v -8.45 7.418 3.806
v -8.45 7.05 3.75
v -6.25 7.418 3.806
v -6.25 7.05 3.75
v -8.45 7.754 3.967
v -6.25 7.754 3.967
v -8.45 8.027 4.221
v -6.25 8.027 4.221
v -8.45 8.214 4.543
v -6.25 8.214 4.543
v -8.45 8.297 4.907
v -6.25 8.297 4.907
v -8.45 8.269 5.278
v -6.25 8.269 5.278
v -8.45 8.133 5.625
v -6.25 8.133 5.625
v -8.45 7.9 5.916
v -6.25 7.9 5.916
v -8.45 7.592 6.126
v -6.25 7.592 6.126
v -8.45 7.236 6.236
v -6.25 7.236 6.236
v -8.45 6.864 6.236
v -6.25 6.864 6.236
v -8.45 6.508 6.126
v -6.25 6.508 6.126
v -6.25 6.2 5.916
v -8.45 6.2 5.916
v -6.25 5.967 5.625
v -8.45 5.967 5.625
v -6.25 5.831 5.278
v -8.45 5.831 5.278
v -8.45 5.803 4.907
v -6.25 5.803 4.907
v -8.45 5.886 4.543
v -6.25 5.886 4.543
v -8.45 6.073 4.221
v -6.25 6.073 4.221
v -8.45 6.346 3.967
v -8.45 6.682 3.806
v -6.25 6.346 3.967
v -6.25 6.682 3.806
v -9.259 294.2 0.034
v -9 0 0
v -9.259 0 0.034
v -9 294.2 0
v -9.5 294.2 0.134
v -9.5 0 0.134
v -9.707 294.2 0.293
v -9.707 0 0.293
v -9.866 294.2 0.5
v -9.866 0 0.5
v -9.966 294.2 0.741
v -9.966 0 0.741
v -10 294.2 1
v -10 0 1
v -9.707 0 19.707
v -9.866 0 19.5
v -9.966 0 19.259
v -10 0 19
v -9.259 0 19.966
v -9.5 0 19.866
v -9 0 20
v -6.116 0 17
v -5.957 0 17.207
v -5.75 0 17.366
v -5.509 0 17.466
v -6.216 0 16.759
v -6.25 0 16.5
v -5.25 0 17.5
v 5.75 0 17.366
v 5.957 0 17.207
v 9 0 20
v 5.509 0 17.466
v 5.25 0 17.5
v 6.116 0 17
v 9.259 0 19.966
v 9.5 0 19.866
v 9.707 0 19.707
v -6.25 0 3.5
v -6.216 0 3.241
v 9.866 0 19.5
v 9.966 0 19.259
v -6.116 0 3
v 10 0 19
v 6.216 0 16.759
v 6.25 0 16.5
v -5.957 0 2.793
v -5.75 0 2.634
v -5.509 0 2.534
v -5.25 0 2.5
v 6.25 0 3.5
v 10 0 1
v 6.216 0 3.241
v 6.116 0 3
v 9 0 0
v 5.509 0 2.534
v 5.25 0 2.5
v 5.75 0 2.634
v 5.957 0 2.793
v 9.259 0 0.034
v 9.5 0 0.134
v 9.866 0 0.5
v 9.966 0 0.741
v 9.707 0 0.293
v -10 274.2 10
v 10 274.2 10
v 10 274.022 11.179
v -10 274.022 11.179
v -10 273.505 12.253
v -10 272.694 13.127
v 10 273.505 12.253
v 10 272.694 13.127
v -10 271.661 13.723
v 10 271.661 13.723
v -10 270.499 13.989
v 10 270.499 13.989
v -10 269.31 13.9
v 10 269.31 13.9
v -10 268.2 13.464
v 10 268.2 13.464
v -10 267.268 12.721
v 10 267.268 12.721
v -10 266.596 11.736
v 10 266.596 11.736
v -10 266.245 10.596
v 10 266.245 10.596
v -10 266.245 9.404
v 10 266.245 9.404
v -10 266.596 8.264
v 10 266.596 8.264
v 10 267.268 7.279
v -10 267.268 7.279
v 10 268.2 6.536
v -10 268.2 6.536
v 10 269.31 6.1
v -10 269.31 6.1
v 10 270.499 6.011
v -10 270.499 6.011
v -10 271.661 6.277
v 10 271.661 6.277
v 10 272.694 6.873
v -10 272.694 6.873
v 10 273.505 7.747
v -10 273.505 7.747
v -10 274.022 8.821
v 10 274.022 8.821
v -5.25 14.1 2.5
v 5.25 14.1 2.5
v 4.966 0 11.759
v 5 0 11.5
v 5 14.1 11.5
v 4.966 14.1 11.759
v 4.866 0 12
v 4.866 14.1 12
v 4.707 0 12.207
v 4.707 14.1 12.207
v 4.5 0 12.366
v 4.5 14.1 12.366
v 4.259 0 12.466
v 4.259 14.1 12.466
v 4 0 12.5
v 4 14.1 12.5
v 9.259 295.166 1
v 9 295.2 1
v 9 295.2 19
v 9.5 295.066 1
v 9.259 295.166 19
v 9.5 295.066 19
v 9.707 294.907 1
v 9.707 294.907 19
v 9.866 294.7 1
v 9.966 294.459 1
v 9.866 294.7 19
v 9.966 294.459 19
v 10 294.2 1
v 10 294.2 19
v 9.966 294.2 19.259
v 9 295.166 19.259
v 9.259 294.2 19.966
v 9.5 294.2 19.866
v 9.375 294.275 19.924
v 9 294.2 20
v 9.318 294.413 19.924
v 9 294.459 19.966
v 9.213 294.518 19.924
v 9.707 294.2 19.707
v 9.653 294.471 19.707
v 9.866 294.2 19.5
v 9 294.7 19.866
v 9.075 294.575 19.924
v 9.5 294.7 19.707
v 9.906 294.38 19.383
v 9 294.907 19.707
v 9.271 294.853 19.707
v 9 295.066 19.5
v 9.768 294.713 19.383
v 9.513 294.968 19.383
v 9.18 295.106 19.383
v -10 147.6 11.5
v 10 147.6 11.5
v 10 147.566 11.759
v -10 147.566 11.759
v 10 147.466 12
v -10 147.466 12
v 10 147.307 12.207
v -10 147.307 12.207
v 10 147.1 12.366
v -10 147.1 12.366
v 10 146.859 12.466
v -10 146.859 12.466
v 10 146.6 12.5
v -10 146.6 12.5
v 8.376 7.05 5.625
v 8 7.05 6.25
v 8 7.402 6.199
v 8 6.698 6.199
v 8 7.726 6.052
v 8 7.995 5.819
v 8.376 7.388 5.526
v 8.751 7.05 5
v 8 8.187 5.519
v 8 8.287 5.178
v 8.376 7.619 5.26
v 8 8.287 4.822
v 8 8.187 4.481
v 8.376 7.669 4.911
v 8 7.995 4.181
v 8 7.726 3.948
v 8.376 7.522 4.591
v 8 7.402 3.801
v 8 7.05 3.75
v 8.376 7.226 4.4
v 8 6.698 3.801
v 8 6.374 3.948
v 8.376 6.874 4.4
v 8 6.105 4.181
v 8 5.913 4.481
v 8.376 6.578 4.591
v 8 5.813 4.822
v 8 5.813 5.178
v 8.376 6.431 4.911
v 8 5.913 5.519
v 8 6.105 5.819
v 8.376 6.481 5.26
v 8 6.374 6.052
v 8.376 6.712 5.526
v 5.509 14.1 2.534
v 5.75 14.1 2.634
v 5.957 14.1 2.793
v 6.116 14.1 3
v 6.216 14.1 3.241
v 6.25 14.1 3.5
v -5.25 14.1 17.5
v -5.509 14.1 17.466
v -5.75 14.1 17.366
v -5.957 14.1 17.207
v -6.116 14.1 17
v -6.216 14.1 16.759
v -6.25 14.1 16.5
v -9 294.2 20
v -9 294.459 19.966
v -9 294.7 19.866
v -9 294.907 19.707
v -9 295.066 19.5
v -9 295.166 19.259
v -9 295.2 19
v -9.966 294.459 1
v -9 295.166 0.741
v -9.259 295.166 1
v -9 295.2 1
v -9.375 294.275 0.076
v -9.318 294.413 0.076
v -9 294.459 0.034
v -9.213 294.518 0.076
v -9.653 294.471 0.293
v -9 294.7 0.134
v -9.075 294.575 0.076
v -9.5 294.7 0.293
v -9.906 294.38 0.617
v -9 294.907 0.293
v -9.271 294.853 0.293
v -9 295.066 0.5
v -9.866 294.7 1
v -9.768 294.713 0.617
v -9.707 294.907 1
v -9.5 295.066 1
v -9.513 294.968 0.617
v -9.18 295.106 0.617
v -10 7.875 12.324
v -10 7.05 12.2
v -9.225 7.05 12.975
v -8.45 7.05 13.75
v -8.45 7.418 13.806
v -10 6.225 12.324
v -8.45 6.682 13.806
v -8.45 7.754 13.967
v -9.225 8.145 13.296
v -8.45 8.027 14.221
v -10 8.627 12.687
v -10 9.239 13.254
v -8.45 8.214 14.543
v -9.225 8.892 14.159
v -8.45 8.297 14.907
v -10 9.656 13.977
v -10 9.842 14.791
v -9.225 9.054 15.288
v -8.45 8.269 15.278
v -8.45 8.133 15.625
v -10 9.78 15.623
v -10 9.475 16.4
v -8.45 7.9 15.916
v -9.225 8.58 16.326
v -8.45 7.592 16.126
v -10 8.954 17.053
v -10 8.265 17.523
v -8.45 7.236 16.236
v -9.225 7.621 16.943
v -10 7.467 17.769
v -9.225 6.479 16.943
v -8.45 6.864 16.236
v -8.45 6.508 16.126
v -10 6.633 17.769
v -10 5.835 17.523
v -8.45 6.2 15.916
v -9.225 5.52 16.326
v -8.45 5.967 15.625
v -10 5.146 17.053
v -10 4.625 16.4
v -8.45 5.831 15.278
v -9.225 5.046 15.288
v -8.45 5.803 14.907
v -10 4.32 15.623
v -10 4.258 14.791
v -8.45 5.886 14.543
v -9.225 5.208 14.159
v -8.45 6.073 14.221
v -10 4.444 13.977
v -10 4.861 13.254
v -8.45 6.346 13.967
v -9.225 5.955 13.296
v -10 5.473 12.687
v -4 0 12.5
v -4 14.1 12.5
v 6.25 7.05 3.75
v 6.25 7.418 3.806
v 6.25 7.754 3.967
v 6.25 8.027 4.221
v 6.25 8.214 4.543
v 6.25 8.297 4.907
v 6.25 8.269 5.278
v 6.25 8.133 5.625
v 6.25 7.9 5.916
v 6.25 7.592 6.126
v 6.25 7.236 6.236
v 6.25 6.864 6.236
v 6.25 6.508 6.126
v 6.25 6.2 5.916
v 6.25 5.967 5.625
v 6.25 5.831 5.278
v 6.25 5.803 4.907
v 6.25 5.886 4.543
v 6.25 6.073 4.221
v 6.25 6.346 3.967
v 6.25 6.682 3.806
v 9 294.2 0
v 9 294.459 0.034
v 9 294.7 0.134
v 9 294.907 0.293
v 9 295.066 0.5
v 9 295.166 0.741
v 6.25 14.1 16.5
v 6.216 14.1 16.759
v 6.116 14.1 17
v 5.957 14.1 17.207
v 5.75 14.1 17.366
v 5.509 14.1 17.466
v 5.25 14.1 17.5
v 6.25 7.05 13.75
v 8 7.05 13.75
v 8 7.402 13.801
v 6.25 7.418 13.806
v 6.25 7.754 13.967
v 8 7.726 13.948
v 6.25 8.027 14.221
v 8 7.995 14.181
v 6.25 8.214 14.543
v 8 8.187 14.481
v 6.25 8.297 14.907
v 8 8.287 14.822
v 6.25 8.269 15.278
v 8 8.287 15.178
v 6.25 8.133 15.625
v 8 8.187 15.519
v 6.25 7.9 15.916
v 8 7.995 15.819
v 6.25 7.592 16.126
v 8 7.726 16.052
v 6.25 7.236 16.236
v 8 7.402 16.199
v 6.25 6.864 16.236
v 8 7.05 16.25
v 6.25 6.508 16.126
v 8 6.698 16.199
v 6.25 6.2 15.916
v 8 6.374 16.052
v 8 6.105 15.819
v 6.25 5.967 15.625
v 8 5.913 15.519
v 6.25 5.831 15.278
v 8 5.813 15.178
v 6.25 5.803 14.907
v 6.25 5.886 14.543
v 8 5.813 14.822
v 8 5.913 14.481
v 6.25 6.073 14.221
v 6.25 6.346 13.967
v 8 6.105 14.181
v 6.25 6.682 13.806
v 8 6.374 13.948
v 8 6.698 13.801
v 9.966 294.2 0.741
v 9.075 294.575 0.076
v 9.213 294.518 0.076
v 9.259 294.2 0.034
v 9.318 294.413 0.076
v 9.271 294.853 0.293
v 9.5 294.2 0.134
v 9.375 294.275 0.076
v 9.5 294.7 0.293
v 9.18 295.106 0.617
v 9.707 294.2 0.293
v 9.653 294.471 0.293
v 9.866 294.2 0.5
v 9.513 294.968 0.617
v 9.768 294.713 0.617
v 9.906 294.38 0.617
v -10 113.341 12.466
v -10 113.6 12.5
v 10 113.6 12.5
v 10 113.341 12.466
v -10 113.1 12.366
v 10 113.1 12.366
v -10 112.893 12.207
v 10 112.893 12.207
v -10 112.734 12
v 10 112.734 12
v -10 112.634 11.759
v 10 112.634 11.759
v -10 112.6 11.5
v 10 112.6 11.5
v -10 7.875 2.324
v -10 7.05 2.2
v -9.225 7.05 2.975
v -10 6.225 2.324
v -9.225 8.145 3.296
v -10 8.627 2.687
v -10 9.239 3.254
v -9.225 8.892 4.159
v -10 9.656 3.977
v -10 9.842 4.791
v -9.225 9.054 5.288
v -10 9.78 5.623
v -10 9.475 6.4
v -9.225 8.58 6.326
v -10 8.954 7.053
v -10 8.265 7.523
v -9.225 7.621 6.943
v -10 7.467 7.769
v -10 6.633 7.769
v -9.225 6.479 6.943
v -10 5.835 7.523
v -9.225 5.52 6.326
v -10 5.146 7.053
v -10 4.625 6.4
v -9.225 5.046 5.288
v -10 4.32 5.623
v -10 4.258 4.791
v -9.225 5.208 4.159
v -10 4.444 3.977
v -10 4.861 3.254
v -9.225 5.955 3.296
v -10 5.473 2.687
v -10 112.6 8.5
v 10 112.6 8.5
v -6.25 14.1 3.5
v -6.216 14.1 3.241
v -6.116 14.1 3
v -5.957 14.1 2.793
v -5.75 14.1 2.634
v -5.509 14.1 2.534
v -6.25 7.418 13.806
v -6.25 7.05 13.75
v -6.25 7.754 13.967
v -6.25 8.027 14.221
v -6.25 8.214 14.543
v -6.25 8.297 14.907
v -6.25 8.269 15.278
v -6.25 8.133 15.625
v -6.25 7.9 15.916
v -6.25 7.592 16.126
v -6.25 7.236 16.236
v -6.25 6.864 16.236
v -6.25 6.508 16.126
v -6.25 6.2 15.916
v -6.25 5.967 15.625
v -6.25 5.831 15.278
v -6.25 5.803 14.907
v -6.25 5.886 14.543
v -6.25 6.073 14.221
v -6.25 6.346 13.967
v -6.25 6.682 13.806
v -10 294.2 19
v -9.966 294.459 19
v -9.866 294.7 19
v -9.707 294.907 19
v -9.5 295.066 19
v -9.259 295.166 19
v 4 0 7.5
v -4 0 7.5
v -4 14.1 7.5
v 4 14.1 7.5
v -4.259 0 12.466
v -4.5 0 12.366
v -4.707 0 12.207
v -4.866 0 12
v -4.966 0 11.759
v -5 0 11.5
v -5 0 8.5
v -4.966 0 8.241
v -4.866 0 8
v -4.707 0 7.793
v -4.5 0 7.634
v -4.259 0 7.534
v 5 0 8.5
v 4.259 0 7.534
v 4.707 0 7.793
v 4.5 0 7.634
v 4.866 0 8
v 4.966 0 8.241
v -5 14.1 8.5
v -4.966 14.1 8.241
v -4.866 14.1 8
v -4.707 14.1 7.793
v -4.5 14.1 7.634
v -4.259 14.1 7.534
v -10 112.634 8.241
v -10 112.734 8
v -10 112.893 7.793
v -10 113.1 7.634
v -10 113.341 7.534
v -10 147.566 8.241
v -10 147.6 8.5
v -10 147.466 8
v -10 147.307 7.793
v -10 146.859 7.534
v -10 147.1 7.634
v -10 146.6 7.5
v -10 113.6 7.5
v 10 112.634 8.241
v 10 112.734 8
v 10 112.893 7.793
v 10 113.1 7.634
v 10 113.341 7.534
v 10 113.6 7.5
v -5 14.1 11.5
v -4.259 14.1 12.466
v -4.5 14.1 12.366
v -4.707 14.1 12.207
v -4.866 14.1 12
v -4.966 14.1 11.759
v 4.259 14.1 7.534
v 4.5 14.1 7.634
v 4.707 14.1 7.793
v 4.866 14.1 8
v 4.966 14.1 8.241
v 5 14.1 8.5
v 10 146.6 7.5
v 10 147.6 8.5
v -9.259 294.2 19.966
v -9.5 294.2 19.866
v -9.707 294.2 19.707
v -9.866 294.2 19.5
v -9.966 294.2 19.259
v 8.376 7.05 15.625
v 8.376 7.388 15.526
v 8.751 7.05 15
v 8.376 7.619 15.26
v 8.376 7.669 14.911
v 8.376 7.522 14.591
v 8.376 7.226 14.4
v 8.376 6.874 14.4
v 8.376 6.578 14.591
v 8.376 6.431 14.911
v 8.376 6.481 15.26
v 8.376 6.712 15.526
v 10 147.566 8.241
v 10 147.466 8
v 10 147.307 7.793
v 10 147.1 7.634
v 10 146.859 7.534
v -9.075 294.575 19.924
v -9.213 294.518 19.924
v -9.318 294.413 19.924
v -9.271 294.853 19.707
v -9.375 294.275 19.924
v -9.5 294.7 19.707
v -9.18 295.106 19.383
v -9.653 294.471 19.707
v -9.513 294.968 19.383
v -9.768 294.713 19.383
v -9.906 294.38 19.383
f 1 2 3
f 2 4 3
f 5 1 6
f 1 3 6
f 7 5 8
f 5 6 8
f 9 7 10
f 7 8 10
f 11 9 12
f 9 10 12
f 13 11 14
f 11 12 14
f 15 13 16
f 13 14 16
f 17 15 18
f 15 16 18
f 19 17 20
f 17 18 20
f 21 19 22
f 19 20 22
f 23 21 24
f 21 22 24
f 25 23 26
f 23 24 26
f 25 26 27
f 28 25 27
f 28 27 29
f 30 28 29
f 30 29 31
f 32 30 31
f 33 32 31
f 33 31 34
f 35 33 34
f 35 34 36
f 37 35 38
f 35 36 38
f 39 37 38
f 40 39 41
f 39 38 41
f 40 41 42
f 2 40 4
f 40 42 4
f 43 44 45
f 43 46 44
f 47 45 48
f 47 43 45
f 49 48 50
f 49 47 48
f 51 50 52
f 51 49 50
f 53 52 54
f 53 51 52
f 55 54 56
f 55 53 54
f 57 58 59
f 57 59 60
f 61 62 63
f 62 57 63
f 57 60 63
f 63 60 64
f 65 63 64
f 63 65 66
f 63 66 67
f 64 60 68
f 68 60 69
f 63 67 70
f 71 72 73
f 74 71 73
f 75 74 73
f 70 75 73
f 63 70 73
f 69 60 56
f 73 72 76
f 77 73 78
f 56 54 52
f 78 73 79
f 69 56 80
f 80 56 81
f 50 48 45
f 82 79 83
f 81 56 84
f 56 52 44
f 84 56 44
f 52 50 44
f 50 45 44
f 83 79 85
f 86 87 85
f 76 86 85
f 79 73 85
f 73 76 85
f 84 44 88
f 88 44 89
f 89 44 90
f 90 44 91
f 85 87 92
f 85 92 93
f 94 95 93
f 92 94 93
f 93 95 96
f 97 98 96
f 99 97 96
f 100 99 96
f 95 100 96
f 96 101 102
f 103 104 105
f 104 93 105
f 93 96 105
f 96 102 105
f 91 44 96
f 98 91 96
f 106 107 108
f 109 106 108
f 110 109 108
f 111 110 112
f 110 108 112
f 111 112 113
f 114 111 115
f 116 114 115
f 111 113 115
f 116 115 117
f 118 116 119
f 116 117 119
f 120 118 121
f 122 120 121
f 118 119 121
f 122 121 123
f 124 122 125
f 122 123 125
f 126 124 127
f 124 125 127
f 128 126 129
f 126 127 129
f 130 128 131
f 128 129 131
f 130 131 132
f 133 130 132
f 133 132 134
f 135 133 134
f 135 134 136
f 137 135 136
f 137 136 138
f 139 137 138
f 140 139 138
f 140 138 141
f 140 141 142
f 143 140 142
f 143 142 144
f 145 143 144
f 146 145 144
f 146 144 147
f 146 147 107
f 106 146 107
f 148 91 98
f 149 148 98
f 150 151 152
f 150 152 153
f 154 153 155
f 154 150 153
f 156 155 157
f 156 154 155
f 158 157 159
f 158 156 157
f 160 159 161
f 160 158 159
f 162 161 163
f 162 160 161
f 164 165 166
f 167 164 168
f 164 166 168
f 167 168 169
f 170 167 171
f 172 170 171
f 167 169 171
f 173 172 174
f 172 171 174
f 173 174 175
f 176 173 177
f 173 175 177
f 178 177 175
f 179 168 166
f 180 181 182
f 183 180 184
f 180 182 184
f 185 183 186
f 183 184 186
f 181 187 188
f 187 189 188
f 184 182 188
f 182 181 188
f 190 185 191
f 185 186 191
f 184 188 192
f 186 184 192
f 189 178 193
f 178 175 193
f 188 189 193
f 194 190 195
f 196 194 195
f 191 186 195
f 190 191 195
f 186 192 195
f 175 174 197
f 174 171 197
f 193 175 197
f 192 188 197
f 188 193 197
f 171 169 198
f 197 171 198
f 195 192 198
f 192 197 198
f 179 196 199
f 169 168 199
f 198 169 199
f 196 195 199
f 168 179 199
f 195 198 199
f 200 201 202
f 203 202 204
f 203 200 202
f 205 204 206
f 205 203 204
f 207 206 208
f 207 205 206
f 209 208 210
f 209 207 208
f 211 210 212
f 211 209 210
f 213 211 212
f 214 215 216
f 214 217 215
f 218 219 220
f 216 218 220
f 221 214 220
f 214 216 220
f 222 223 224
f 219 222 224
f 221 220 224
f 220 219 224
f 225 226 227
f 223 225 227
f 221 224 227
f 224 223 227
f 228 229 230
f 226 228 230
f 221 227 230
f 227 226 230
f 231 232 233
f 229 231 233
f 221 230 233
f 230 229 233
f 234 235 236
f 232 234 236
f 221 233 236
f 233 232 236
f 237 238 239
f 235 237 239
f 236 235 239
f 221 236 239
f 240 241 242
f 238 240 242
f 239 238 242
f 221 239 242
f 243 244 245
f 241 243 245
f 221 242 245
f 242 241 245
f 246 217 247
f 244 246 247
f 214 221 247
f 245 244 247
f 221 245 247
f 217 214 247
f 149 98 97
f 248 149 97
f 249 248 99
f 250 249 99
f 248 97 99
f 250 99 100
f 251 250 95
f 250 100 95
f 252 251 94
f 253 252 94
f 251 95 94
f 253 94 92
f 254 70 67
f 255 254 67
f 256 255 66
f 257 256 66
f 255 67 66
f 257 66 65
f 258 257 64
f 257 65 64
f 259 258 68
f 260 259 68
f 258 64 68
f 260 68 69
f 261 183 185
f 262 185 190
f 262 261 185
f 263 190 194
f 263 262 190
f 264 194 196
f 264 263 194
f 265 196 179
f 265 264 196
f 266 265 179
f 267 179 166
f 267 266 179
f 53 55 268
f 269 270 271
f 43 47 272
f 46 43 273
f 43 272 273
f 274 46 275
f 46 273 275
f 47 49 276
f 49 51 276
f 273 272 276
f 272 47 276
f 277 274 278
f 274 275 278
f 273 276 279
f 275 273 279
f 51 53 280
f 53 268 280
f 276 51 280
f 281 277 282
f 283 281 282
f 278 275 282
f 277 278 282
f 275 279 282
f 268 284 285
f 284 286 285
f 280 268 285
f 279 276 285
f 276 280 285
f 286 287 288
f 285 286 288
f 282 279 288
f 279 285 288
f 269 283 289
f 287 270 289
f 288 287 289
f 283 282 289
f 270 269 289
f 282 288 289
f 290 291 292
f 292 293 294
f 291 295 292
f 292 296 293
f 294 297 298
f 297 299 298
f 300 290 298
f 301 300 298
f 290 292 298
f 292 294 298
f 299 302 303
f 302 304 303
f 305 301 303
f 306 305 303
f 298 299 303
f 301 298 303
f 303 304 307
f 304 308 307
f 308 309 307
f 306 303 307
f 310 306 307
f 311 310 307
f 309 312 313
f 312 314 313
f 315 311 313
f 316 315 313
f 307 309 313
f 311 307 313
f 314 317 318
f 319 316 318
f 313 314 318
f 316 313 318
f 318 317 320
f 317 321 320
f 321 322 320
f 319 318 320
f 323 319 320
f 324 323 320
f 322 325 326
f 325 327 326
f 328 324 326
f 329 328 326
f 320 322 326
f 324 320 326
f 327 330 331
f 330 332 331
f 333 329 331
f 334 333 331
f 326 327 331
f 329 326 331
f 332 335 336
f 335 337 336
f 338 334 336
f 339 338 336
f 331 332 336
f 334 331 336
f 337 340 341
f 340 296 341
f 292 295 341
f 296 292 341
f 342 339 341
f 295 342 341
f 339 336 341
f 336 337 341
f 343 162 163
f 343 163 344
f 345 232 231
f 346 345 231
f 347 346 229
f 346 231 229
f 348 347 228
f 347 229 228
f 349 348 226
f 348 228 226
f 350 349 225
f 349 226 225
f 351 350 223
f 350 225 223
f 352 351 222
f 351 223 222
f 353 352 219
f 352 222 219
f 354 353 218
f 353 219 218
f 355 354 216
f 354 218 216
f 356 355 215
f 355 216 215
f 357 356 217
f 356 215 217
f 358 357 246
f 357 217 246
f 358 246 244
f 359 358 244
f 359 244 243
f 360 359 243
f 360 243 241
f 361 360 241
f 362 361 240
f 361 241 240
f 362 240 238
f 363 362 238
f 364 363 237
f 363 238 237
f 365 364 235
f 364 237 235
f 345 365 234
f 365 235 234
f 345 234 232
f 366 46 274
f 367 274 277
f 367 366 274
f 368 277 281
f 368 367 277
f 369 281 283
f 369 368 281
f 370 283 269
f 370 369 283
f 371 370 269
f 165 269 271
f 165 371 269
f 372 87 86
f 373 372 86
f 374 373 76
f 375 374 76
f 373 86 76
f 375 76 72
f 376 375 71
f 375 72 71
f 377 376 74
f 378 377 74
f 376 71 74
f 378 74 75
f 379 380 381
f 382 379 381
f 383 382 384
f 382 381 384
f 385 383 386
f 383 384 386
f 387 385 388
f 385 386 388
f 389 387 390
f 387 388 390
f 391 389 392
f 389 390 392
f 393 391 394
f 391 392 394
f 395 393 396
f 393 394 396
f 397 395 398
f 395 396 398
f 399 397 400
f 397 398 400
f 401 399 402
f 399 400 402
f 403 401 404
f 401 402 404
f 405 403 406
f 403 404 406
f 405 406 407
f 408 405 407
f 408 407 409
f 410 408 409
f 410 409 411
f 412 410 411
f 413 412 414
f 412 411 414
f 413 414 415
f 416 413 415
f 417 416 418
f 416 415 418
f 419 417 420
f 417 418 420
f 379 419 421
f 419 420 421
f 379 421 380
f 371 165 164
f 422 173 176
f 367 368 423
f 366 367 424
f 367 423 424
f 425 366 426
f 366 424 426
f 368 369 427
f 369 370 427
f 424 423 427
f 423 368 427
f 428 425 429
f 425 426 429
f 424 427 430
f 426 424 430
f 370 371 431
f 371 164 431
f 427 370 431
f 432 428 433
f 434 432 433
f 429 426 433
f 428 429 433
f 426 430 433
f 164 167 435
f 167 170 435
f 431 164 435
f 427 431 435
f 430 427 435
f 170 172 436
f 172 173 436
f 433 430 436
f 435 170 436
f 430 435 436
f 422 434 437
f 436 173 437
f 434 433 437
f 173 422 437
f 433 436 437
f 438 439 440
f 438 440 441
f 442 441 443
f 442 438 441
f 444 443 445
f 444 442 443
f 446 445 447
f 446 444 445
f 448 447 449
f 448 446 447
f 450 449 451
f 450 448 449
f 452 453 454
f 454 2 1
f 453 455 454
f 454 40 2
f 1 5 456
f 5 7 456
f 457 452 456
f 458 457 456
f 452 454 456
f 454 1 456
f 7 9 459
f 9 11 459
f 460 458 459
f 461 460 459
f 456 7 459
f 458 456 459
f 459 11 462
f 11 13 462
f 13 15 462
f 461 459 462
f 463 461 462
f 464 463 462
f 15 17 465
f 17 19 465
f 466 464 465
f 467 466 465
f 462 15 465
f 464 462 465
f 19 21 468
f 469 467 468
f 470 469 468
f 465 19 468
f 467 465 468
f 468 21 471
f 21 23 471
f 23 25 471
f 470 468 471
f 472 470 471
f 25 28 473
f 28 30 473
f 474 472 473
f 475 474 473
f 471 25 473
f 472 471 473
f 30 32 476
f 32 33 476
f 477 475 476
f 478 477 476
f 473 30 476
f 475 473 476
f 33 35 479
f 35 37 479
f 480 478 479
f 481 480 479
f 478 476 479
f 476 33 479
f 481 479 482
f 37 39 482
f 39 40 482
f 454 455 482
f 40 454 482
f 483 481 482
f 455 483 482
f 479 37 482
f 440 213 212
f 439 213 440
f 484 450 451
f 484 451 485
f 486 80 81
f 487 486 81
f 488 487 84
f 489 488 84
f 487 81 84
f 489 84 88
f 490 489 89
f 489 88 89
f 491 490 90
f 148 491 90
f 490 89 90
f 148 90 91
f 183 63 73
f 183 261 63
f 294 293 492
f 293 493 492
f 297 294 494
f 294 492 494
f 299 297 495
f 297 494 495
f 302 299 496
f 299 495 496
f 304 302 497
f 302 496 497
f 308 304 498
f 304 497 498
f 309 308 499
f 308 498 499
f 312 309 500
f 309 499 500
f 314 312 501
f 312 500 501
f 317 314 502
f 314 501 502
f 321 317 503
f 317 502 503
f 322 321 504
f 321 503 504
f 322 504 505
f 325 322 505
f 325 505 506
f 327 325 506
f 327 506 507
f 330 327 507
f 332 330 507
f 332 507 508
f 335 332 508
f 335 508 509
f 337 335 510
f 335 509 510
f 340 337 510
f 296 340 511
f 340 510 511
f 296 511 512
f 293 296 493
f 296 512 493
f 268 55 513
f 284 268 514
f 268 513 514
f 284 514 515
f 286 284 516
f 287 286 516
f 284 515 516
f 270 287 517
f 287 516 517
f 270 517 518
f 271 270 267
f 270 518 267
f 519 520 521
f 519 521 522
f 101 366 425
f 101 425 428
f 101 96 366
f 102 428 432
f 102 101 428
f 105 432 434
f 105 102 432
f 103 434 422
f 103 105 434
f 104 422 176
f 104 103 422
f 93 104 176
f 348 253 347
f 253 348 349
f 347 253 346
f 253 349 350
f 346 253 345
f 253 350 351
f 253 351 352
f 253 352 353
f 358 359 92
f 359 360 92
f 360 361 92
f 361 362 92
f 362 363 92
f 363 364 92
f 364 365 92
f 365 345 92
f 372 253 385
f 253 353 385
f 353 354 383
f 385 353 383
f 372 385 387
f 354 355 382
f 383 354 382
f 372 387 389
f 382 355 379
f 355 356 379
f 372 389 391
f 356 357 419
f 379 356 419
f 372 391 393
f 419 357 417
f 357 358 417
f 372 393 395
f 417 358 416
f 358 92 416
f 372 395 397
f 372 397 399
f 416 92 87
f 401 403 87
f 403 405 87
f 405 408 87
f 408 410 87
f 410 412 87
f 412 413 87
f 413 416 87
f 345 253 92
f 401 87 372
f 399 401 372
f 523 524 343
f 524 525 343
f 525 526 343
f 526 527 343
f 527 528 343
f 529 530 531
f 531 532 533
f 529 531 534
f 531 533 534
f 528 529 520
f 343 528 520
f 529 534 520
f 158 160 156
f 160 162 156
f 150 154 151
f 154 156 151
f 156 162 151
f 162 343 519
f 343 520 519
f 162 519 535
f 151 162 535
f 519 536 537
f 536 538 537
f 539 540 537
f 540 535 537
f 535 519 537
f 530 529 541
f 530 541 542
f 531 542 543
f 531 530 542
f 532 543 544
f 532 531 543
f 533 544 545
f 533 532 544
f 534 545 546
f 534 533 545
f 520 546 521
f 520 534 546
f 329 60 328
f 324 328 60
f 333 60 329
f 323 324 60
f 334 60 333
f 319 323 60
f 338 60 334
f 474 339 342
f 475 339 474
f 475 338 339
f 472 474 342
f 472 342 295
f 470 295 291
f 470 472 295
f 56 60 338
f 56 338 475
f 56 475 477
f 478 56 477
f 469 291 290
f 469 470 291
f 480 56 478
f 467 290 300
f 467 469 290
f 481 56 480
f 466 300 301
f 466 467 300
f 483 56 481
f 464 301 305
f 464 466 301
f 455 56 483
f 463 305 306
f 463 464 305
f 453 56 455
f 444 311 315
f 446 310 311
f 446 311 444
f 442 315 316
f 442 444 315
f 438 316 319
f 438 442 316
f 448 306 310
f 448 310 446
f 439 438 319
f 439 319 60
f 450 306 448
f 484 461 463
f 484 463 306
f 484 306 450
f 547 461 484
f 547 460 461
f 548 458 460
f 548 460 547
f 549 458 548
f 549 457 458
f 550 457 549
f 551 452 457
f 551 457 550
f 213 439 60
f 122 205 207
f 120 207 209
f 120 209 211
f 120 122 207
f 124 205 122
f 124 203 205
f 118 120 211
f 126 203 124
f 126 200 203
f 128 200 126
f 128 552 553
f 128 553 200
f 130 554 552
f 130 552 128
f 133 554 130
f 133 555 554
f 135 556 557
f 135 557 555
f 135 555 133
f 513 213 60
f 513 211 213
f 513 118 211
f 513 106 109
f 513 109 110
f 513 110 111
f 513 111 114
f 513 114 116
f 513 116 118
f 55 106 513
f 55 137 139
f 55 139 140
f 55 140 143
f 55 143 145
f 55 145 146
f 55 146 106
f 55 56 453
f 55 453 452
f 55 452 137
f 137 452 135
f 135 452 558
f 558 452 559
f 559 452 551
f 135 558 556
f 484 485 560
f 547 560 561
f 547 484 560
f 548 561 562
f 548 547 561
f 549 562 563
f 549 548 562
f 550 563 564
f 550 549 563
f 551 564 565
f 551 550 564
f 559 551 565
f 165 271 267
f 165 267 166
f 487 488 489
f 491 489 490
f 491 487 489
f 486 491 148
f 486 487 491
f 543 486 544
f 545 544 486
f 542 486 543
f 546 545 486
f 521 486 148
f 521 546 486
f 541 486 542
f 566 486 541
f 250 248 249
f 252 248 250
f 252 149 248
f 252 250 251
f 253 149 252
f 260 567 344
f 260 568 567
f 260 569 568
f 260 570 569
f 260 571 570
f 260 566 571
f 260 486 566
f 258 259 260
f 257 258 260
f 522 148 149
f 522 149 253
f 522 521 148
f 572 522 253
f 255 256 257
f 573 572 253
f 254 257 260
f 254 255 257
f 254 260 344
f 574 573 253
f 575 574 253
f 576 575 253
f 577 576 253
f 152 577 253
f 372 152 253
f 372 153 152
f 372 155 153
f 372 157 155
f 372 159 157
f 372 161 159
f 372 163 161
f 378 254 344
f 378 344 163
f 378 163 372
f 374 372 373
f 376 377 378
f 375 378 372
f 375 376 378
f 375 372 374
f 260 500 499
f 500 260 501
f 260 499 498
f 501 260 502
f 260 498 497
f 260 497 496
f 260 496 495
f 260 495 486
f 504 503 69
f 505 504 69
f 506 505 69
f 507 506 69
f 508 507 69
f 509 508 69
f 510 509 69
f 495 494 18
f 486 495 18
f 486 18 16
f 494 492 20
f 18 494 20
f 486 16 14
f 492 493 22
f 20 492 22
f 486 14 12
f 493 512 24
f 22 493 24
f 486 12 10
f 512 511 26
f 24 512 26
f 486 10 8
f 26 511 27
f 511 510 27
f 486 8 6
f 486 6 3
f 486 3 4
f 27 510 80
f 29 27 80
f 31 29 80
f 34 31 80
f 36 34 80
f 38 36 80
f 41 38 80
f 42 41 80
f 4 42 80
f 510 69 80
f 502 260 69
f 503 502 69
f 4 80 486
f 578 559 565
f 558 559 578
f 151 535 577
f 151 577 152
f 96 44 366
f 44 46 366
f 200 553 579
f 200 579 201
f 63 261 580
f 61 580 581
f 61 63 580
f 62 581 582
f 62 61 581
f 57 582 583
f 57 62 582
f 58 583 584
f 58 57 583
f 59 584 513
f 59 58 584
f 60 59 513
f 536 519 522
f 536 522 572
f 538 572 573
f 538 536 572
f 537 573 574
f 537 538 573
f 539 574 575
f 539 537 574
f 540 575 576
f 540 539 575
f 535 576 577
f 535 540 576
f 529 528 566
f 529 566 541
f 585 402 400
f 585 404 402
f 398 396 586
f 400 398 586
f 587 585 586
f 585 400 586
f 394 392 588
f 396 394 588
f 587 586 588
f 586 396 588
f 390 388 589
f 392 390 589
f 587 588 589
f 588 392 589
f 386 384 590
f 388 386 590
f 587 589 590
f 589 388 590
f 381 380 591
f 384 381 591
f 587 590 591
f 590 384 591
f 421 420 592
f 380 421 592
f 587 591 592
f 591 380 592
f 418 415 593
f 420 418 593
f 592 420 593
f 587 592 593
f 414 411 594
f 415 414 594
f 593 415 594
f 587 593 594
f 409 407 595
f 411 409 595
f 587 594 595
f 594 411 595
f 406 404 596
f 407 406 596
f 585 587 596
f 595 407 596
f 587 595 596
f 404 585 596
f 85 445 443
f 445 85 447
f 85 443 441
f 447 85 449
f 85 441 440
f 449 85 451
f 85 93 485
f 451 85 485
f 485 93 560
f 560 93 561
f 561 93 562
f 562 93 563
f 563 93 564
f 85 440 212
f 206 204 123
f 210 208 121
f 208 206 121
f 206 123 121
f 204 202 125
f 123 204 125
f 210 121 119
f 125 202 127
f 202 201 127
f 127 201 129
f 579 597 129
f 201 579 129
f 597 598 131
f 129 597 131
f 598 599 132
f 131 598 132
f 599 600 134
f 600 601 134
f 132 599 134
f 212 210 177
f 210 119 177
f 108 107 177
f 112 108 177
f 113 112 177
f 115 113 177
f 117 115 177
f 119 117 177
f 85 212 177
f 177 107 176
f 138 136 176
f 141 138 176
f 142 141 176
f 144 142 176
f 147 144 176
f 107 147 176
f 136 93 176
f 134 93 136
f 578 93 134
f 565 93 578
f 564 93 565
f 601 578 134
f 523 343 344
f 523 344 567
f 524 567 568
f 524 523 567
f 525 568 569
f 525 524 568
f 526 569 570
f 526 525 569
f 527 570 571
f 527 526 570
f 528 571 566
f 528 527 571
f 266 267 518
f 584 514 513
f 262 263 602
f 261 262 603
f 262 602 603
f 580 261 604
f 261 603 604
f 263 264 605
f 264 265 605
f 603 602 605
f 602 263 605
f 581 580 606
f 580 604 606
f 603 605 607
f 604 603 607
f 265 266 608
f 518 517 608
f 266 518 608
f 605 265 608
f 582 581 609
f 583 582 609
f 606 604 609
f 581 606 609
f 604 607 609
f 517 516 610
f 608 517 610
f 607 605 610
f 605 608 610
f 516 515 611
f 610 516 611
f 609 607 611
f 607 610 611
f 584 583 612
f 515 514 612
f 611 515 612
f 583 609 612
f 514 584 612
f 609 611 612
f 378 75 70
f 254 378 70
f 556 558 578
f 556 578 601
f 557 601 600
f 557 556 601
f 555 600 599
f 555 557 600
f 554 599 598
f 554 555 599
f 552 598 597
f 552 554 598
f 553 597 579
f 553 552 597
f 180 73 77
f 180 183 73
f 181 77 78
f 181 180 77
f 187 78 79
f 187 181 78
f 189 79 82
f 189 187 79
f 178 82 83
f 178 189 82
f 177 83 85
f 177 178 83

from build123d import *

# Parameters (mm, degrees)
SKETCH1_W                       = 20
SKETCH1_H                       = 295.2
BOSS_EXTRUDE1_DEPTH             = 20
CUT_EXTRUDE1_REACH              = 298.552
SKETCH2_R                       = 4
CUT_EXTRUDE2_DEPTH              = 14.1
CUT_EXTRUDE3_DEPTH              = 297.551917883
M3X0_5_TAPPED_HOLE1_D           = 2.5
M3X0_5_TAPPED_HOLE1_DEPTH       = 18
M3X0_5_TAPPED_HOLE1_CSINK_D     = 5.6
M3X0_5_TAPPED_HOLE1_CSINK_ANGLE = 90
M3X0_5_TAPPED_HOLE1_TIP         = 0.751075774
FILLET1_R                       = 1
FILLET2_R                       = 1


with BuildPart() as part:
    # Sketch1 → Boss-Extrude1 (new body)
    with BuildSketch(Plane.XY):
        with Locations((0, 147.6)):
            Rectangle(SKETCH1_W, SKETCH1_H)
    extrude(amount=BOSS_EXTRUDE1_DEPTH)

    # Sketch2 → Cut-Extrude1 (cut, up to next)
    with BuildSketch(Plane(origin=(10, 0, 0), x_dir=(0, 0, -1), z_dir=(1, 0, 0)), mode=Mode.PRIVATE) as cut_extrude1_sk1:
        with Locations(Location((-10, 270.2, 0), (0, 0, 90))):
            Circle(SKETCH2_R)
    cut_extrude1_tool1 = extrude(cut_extrude1_sk1.sketch, amount=-CUT_EXTRUDE1_REACH, mode=Mode.PRIVATE) & part.part
    add(cut_extrude1_tool1.solids().sort_by_distance((10, 270.2, 10))[0], mode=Mode.SUBTRACT)

    # Sketch3 → Cut-Extrude2 (cut)
    with BuildSketch(Plane.XZ):
        with BuildLine():
            Line((-5.25, 2.5), (5.25, 2.5))
            ThreePointArc((5.25, 2.5), (5.957106781, 2.792893219), (6.25, 3.5))
            Line((6.25, 3.5), (6.25, 16.5))
            ThreePointArc((6.25, 16.5), (5.957106781, 17.207106781), (5.25, 17.5))
            Line((5.25, 17.5), (-5.25, 17.5))
            ThreePointArc((-5.25, 17.5), (-5.957106781, 17.207106781), (-6.25, 16.5))
            Line((-6.25, 16.5), (-6.25, 3.5))
            ThreePointArc((-6.25, 3.5), (-5.957106781, 2.792893219), (-5.25, 2.5))
        make_face()
        with BuildLine():
            Line((-4, 7.5), (4, 7.5))
            ThreePointArc((4, 7.5), (4.707106781, 7.792893219), (5, 8.5))
            Line((5, 8.5), (5, 11.5))
            ThreePointArc((5, 11.5), (4.707106781, 12.207106781), (4, 12.5))
            Line((4, 12.5), (-4, 12.5))
            ThreePointArc((-4, 12.5), (-4.707106781, 12.207106781), (-5, 11.5))
            Line((-5, 11.5), (-5, 8.5))
            ThreePointArc((-5, 8.5), (-4.707106781, 7.792893219), (-4, 7.5))
        make_face(mode=Mode.SUBTRACT)
    extrude(amount=-CUT_EXTRUDE2_DEPTH, mode=Mode.SUBTRACT)

    # Sketch5 → Cut-Extrude3 (cut, through all)
    with BuildSketch(Plane.ZY.offset(10)):
        with BuildLine():
            Line((8.5, 147.6), (11.5, 147.6))
            ThreePointArc((11.5, 147.6), (12.207106781, 147.307106781), (12.5, 146.6))
            Line((12.5, 146.6), (12.5, 113.6))
            ThreePointArc((12.5, 113.6), (12.207106781, 112.892893219), (11.5, 112.6))
            Line((11.5, 112.6), (8.5, 112.6))
            ThreePointArc((8.5, 112.6), (7.792893219, 112.892893219), (7.5, 113.6))
            Line((7.5, 113.6), (7.5, 146.6))
            ThreePointArc((7.5, 146.6), (7.792893219, 147.307106781), (8.5, 147.6))
        make_face()
    extrude(amount=-CUT_EXTRUDE3_DEPTH, mode=Mode.SUBTRACT)

    # M3x0.5 Tapped Hole1
    with Locations(Plane.ZY.offset(10)):
        with Locations((15, 7.05), (5, 7.05)):
            CounterSinkHole(M3X0_5_TAPPED_HOLE1_D / 2, M3X0_5_TAPPED_HOLE1_CSINK_D / 2, depth=M3X0_5_TAPPED_HOLE1_DEPTH, counter_sink_angle=M3X0_5_TAPPED_HOLE1_CSINK_ANGLE)
            with Locations((0, 0, -(M3X0_5_TAPPED_HOLE1_DEPTH + M3X0_5_TAPPED_HOLE1_TIP / 2))):  # 118° drill point
                Cone(0, M3X0_5_TAPPED_HOLE1_D / 2, M3X0_5_TAPPED_HOLE1_TIP, mode=Mode.SUBTRACT)

    # Fillet1
    fillet1_edges = [part.edges().sort_by_distance(p)[0] for p in [
        (-10, 295.2, 10),
        (10, 295.2, 10),
    ]]
    fillet(fillet1_edges, radius=FILLET1_R)

    # Fillet2
    fillet2_edges = [part.edges().sort_by_distance(p)[0] for p in [
        (10, 147.1, 20),
        (0, 295.2, 0),
        (0, 295.2, 20),
        (-10, 147.1, 0),
        (-9.707106781, 294.907106781, 0),
        (9.707106781, 294.907106781, 0),
        (-10, 147.1, 20),
        (-9.707106781, 294.907106781, 20),
        (9.707106781, 294.907106781, 20),
        (10, 147.1, 0),
    ]]
    fillet(fillet2_edges, radius=FILLET2_R)


solid = part.part
